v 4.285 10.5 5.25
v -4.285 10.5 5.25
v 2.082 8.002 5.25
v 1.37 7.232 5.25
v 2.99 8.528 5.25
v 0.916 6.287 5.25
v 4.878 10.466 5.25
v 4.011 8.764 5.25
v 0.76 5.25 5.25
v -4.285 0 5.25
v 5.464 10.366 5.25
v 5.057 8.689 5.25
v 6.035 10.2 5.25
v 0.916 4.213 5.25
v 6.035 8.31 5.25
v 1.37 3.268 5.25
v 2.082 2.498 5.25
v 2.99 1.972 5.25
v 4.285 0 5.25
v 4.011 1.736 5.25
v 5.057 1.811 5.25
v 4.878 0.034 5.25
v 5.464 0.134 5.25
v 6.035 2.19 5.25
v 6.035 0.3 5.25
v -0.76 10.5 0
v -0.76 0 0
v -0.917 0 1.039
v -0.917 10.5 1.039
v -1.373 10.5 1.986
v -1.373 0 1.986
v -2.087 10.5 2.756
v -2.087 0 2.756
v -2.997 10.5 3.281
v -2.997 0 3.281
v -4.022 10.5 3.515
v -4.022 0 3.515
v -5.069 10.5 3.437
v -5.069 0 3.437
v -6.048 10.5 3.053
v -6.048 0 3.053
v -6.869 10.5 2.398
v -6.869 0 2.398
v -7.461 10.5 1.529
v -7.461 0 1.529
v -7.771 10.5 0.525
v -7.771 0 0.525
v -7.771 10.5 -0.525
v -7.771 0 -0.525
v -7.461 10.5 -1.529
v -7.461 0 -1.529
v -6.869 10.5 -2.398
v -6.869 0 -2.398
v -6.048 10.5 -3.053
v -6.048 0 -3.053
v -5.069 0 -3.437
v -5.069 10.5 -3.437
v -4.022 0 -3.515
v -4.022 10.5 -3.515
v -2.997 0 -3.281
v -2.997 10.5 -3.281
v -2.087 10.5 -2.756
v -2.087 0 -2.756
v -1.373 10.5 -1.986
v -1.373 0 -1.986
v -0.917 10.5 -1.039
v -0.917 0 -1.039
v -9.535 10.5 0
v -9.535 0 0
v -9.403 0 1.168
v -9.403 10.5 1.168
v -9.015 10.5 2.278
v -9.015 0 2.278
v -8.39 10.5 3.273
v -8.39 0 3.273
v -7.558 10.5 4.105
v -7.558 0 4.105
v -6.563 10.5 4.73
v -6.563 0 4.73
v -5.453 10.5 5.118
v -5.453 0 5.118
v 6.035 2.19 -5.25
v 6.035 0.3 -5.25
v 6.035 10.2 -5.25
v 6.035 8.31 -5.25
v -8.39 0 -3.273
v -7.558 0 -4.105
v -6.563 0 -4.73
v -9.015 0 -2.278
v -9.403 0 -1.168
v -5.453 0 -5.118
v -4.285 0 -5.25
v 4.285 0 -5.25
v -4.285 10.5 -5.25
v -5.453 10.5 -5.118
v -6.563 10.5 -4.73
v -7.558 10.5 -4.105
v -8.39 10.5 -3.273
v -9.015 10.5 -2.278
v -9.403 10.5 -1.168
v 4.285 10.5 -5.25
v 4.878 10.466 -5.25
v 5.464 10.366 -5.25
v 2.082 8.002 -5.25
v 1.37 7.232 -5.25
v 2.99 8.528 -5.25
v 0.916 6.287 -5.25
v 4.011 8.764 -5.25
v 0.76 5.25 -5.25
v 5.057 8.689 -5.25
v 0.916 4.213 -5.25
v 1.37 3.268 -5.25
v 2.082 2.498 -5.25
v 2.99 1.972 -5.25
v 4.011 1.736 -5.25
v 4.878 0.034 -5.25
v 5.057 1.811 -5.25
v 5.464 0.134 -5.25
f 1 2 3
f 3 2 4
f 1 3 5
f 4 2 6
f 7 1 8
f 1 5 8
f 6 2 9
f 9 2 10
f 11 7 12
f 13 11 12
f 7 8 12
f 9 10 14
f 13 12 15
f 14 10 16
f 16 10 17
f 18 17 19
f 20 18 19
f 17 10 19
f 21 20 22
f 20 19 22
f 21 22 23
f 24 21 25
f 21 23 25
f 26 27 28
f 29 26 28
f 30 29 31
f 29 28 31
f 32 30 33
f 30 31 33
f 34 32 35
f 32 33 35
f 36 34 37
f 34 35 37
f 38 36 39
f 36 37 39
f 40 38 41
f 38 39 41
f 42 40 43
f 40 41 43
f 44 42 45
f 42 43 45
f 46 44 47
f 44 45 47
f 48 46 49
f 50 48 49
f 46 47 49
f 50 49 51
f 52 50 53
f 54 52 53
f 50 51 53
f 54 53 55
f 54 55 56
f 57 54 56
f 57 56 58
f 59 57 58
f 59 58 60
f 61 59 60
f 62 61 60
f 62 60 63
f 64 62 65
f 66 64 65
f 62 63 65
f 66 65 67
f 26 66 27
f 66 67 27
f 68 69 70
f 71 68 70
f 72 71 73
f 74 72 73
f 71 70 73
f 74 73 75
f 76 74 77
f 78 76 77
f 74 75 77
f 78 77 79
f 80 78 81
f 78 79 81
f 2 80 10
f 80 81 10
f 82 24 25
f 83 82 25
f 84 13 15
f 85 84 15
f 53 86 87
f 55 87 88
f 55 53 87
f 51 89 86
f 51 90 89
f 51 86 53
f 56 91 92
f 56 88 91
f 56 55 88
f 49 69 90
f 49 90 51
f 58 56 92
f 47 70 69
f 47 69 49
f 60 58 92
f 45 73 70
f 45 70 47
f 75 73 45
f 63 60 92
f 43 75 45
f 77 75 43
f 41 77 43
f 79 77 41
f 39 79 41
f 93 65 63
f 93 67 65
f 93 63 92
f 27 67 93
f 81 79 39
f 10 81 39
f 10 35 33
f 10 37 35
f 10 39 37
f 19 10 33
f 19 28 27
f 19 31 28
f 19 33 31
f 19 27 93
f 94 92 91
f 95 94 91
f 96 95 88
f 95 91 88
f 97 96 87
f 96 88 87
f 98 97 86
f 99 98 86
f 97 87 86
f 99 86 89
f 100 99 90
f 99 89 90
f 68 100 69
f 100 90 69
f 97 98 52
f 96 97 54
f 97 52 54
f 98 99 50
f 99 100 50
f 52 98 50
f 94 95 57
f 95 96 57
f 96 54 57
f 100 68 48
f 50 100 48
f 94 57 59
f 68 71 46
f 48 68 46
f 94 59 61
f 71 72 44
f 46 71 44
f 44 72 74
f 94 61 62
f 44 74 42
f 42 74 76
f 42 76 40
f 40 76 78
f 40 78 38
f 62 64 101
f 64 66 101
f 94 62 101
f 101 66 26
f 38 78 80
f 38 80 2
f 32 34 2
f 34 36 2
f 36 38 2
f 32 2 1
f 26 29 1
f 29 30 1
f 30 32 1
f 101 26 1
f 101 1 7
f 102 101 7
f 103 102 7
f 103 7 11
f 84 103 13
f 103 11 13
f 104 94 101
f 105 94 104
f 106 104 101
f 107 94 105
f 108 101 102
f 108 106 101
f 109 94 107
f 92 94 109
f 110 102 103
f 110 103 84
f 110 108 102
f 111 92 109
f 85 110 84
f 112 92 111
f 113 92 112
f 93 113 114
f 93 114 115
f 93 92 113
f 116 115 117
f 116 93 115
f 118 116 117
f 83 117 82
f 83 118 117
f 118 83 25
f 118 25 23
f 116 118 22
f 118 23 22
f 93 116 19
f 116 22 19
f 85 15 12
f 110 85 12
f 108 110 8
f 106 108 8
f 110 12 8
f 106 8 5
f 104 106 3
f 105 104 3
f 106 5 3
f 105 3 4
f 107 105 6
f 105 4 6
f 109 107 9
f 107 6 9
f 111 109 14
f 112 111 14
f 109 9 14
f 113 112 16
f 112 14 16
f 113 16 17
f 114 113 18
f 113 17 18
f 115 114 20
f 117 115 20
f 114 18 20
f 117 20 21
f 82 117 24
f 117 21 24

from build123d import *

# Parameters (mm, degrees)
F0_W     = 19.07
F0_H     = 10.5
F1_DEPTH = 10.5
F2_R     = 3.525
F3_DEPTH = 10.5
F5_DEPTH = 10.5


with BuildPart() as f1:
    # F0 (on Front) → F1 (new body)
    with BuildSketch(Plane.XZ):
        Rectangle(F0_W, F0_H)
    extrude(amount=-F1_DEPTH)

    # F2 (on face) → F3 (cut, through all)
    with BuildSketch(Plane.XZ):
        with BuildLine():
            ThreePointArc((-4.285, -5.25), (-7.997311, -3.712311), (-9.535, 0))
            Line((-9.535, 0), (-9.535, -5.25))
            Line((-9.535, -5.25), (-4.285, -5.25))
        make_face()
        with BuildLine():
            ThreePointArc((-9.535, 0), (-7.997311, 3.712311), (-4.285, 5.25))
            Line((-4.285, 5.25), (-9.535, 5.25))
            Line((-9.535, 5.25), (-9.535, 0))
        make_face()
        with Locations((-4.285, 0)):
            Circle(F2_R)
    extrude(amount=-F3_DEPTH, mode=Mode.SUBTRACT)

    # F4 (on face) → F5 (cut, through all)
    with BuildSketch(Plane.XY.offset(5.25)):
        with BuildLine():
            ThreePointArc((6.035, 0.300253), (5.172785, 0.075608), (4.285, 0))
            Line((4.285, 0), (9.535, 0))
            Line((9.535, 0), (9.535, 10.5))
            Line((9.535, 10.5), (4.285, 10.5))
            ThreePointArc((4.285, 10.5), (5.172785, 10.424392), (6.035, 10.199747))
            Line((6.035, 10.199747), (6.035, 8.309922))
            ThreePointArc((6.035, 8.309922), (0.76, 5.25), (6.035, 2.190078))
            Line((6.035, 2.190078), (6.035, 0.300253))
        make_face()
    extrude(amount=-F5_DEPTH, mode=Mode.SUBTRACT)


solid = f1.part
